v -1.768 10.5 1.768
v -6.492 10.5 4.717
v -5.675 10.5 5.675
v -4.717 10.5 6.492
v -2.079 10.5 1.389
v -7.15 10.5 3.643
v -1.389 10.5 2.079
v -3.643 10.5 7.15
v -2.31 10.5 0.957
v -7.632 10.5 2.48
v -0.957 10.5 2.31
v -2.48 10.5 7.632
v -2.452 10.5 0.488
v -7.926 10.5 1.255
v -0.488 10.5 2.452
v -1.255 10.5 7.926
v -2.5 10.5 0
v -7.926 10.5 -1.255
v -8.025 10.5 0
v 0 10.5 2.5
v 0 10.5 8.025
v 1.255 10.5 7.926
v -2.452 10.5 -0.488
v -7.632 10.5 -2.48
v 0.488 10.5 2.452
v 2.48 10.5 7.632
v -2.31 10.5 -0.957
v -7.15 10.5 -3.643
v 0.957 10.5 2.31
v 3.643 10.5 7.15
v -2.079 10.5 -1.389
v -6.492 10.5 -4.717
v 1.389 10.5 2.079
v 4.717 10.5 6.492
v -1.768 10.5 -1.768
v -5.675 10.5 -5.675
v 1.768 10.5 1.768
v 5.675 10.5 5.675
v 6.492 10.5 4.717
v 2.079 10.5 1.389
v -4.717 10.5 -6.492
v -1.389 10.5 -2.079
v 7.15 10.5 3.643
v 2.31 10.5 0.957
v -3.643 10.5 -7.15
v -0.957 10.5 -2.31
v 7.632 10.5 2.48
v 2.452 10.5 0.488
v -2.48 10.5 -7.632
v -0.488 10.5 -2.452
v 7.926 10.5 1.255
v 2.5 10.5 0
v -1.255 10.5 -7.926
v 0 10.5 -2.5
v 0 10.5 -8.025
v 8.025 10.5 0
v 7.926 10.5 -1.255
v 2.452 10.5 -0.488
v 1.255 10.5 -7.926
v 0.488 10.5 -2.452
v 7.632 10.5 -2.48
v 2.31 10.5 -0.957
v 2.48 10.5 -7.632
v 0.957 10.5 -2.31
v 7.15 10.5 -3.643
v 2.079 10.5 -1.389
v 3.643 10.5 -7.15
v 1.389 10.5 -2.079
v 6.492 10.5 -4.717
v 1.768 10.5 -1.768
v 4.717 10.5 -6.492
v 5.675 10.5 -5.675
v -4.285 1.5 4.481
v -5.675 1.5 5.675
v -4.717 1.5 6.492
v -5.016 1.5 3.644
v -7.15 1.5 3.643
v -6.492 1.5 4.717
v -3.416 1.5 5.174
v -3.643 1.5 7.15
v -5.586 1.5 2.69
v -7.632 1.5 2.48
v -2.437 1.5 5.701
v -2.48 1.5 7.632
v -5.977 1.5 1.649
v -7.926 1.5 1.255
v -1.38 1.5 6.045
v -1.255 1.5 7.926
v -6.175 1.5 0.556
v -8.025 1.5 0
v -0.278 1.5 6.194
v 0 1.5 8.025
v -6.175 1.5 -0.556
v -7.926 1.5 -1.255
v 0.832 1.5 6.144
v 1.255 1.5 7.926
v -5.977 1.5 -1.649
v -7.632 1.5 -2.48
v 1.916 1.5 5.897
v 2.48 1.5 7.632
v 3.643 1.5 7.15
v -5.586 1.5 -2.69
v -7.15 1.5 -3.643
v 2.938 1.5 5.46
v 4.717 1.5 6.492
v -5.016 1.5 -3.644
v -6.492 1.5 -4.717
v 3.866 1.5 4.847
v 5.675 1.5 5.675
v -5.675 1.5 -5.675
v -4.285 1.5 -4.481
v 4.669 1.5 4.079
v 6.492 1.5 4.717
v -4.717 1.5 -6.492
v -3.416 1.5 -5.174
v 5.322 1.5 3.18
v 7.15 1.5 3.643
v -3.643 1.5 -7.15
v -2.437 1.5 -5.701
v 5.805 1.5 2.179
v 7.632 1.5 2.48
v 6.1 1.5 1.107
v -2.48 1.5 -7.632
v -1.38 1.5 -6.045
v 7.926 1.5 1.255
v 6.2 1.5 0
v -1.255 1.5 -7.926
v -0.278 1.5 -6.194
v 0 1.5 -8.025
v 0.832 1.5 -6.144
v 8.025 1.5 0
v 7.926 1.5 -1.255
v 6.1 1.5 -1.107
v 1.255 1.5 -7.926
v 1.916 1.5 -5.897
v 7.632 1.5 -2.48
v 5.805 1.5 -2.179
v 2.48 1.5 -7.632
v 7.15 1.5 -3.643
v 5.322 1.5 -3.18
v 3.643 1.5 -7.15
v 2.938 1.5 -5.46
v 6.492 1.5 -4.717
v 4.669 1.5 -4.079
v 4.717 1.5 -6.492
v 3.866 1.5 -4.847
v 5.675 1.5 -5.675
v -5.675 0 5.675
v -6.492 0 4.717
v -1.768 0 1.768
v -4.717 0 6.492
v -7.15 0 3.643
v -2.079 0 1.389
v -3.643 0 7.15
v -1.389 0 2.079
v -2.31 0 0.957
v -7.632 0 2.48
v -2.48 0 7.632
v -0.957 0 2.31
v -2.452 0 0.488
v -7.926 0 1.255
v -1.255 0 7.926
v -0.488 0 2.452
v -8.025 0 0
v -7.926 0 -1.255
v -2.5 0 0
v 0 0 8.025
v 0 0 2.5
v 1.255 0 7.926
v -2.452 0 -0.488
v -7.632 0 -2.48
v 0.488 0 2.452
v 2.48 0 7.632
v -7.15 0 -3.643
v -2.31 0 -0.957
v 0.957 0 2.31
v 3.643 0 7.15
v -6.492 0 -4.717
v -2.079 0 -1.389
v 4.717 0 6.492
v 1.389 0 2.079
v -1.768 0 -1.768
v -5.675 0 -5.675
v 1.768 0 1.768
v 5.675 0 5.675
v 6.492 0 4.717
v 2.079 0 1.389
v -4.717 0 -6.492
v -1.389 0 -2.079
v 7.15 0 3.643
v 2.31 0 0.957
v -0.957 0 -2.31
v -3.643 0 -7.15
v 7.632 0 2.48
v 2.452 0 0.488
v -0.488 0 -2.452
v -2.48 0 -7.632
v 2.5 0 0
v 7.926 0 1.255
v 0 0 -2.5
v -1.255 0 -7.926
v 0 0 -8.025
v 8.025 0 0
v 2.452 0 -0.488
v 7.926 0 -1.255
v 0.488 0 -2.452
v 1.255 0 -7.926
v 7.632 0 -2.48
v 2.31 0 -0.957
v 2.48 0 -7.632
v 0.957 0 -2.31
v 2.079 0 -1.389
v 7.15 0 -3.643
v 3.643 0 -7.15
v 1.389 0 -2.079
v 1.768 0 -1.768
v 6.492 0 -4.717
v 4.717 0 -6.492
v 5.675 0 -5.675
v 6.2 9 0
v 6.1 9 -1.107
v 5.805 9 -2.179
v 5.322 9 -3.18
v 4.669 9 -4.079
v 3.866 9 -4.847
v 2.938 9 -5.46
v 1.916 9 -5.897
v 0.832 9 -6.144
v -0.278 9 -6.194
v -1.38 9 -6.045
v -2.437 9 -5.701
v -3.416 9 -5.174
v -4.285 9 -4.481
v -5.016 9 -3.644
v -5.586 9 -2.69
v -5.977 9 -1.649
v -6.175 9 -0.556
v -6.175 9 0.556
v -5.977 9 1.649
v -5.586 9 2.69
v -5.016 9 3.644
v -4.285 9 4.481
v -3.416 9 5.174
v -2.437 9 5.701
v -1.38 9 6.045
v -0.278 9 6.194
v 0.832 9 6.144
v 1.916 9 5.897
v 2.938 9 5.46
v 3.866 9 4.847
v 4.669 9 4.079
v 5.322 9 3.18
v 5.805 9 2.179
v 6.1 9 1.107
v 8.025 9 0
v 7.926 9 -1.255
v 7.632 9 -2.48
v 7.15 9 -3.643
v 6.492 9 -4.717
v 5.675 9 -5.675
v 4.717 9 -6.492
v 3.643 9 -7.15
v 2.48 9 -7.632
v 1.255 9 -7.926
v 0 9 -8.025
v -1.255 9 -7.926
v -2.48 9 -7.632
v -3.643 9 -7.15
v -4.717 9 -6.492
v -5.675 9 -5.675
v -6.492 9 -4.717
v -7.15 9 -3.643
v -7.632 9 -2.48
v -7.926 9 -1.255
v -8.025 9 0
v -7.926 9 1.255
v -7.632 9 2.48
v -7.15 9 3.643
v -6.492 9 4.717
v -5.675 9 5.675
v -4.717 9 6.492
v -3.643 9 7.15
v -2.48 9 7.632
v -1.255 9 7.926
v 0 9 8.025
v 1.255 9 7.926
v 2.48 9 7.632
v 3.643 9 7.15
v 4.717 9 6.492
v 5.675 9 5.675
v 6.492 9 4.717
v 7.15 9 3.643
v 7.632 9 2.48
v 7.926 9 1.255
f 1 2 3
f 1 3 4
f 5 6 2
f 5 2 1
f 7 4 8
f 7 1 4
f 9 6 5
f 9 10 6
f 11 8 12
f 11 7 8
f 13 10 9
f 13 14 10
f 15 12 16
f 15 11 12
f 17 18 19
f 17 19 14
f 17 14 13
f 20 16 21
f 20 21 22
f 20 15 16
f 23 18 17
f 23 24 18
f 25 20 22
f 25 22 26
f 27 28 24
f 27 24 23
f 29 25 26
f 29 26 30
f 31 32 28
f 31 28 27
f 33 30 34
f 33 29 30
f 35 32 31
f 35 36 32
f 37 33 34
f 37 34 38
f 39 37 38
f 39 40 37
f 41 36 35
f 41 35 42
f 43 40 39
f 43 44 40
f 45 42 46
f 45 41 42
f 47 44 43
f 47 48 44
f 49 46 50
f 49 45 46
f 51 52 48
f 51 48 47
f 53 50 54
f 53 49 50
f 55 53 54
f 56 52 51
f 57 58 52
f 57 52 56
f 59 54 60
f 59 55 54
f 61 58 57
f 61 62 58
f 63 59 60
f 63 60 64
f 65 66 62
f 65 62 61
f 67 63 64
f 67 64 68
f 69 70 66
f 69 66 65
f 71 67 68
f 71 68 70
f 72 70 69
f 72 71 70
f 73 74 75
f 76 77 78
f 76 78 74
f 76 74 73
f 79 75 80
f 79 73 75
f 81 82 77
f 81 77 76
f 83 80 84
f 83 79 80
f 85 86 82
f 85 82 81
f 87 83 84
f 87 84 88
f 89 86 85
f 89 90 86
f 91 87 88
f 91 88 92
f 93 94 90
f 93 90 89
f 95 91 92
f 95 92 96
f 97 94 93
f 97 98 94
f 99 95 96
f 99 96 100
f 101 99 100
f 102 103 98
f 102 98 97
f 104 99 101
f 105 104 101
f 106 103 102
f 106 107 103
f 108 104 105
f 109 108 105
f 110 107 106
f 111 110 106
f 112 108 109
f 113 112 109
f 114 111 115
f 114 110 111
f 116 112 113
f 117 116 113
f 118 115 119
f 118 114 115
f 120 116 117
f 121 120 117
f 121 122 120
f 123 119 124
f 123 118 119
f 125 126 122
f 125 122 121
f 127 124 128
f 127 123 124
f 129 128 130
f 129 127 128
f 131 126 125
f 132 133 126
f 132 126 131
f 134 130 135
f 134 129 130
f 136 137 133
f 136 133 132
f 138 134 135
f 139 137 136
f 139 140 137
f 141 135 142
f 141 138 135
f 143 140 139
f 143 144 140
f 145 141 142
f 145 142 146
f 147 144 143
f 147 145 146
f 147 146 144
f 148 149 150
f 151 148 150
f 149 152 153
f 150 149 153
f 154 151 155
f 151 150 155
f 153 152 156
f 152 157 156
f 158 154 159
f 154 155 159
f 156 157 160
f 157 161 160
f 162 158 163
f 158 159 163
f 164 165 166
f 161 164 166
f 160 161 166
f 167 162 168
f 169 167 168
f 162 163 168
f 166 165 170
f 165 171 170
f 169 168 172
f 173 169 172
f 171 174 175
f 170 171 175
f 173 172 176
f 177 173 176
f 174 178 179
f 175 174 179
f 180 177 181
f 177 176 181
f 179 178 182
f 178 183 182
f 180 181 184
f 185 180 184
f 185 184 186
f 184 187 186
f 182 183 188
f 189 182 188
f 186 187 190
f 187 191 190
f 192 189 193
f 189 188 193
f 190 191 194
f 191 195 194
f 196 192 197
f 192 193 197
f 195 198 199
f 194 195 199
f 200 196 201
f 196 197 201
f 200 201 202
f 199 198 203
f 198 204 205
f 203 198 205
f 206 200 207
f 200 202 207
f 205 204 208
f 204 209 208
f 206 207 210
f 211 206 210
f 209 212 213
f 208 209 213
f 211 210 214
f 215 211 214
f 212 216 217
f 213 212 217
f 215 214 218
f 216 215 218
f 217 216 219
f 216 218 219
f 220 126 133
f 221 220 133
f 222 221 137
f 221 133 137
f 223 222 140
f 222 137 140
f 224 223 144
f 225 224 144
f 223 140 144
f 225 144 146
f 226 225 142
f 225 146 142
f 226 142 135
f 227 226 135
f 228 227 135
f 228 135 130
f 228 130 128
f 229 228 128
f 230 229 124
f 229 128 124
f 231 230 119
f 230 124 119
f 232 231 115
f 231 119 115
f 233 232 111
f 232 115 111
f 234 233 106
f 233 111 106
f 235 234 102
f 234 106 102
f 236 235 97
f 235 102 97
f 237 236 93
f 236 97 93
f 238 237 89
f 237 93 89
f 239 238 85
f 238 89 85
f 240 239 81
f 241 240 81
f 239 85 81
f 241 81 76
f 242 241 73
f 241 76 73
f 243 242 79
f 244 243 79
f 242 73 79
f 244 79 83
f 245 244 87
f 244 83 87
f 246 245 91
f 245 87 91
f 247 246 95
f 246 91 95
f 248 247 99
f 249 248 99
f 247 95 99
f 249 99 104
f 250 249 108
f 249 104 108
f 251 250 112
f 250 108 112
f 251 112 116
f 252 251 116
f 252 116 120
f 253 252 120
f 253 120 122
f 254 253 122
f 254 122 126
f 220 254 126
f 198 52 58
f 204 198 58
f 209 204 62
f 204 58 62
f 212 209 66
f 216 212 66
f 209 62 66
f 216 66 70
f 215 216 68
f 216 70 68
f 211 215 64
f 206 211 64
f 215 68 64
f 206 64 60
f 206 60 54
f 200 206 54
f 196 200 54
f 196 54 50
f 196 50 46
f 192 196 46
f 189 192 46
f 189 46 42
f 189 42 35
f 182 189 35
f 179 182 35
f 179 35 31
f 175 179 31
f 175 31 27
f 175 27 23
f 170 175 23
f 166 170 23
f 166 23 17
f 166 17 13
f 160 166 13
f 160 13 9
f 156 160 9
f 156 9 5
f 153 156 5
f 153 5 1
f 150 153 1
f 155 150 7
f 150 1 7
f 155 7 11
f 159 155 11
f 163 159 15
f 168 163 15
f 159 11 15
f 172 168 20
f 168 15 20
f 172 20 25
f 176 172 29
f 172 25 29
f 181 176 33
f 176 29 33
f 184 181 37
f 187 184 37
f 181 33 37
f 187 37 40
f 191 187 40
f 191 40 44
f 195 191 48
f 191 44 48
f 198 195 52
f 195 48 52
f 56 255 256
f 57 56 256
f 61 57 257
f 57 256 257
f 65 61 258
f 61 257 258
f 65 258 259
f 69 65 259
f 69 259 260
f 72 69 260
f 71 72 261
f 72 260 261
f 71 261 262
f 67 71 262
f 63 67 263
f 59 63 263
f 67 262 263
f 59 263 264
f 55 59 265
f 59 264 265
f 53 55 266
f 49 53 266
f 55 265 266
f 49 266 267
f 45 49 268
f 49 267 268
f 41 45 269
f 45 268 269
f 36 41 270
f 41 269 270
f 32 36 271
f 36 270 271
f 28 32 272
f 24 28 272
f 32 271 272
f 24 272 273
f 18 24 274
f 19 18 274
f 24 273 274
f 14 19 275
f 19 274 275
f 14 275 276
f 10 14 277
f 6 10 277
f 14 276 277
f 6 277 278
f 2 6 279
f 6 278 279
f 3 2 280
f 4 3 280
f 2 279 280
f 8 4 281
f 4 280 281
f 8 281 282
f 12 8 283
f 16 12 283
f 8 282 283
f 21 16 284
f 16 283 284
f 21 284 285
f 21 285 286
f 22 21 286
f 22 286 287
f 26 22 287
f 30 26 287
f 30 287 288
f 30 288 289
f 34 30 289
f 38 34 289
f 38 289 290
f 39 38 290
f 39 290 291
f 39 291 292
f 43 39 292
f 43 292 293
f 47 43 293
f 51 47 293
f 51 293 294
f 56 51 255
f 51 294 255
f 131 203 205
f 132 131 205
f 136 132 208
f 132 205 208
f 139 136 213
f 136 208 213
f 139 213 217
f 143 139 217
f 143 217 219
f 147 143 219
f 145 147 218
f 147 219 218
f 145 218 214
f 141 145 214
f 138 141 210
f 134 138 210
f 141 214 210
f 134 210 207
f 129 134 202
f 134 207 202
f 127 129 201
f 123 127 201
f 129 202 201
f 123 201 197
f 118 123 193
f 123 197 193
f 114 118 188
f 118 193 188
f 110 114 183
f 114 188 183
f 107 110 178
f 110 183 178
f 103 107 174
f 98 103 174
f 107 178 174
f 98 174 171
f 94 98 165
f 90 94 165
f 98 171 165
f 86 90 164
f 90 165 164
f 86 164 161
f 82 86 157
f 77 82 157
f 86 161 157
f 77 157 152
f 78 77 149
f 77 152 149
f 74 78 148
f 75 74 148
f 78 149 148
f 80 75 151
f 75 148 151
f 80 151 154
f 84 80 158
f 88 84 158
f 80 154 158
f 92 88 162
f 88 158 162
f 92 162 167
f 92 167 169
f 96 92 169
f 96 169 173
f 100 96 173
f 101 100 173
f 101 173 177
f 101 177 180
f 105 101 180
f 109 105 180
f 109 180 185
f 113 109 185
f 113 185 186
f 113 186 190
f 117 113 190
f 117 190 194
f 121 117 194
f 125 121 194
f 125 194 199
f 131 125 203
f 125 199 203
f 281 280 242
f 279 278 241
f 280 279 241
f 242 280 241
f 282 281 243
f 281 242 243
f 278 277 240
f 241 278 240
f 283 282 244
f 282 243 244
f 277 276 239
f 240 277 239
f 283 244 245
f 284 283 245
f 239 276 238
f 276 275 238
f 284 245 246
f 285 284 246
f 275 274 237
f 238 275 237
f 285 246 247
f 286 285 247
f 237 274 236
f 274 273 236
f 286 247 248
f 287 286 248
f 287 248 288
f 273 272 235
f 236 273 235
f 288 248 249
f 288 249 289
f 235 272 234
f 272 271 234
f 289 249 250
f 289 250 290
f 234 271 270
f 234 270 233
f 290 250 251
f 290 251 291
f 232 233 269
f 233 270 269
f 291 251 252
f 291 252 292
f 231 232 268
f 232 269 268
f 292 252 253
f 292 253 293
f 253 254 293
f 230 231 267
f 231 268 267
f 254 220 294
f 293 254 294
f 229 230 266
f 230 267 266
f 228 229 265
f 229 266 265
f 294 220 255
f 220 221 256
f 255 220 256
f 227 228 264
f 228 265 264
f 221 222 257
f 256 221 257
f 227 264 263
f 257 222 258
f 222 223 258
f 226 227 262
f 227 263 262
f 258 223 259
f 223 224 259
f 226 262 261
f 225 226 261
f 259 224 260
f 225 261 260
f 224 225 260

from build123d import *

# Parameters (mm, degrees)
SKETCH1_R           = 8.025
BOSS_EXTRUDE1_DEPTH = 1.5
SKETCH2_R           = 6.2
BOSS_EXTRUDE2_DEPTH = 7.5
SKETCH3_R           = 8.025
BOSS_EXTRUDE3_DEPTH = 1.5
SKETCH4_R           = 2.5
CUT_EXTRUDE1_DEPTH  = 11.5


with BuildPart() as part:
    # Sketch1 → Boss-Extrude1 (new body)
    with BuildSketch(Plane(origin=(0, 0, 0), x_dir=(1, 0, 0), z_dir=(0, 1, 0))):
        Circle(SKETCH1_R)
    extrude(amount=BOSS_EXTRUDE1_DEPTH)

    # Sketch2 → Boss-Extrude2 (add)
    with BuildSketch(Plane(origin=(0, 1.5, 0), x_dir=(1, 0, 0), z_dir=(0, 1, 0))):
        Circle(SKETCH2_R)
    extrude(amount=BOSS_EXTRUDE2_DEPTH)

    # Sketch3 → Boss-Extrude3 (add)
    with BuildSketch(Plane(origin=(0, 9, 0), x_dir=(1, 0, 0), z_dir=(0, 1, 0))):
        Circle(SKETCH3_R)
    extrude(amount=BOSS_EXTRUDE3_DEPTH)

    # Sketch4 → Cut-Extrude1 (cut, through all)
    with BuildSketch(Plane(origin=(0, 10.5, 0), x_dir=(1, 0, 0), z_dir=(0, 1, 0))):
        Circle(SKETCH4_R)
    extrude(amount=-CUT_EXTRUDE1_DEPTH, mode=Mode.SUBTRACT)


solid = part.part
